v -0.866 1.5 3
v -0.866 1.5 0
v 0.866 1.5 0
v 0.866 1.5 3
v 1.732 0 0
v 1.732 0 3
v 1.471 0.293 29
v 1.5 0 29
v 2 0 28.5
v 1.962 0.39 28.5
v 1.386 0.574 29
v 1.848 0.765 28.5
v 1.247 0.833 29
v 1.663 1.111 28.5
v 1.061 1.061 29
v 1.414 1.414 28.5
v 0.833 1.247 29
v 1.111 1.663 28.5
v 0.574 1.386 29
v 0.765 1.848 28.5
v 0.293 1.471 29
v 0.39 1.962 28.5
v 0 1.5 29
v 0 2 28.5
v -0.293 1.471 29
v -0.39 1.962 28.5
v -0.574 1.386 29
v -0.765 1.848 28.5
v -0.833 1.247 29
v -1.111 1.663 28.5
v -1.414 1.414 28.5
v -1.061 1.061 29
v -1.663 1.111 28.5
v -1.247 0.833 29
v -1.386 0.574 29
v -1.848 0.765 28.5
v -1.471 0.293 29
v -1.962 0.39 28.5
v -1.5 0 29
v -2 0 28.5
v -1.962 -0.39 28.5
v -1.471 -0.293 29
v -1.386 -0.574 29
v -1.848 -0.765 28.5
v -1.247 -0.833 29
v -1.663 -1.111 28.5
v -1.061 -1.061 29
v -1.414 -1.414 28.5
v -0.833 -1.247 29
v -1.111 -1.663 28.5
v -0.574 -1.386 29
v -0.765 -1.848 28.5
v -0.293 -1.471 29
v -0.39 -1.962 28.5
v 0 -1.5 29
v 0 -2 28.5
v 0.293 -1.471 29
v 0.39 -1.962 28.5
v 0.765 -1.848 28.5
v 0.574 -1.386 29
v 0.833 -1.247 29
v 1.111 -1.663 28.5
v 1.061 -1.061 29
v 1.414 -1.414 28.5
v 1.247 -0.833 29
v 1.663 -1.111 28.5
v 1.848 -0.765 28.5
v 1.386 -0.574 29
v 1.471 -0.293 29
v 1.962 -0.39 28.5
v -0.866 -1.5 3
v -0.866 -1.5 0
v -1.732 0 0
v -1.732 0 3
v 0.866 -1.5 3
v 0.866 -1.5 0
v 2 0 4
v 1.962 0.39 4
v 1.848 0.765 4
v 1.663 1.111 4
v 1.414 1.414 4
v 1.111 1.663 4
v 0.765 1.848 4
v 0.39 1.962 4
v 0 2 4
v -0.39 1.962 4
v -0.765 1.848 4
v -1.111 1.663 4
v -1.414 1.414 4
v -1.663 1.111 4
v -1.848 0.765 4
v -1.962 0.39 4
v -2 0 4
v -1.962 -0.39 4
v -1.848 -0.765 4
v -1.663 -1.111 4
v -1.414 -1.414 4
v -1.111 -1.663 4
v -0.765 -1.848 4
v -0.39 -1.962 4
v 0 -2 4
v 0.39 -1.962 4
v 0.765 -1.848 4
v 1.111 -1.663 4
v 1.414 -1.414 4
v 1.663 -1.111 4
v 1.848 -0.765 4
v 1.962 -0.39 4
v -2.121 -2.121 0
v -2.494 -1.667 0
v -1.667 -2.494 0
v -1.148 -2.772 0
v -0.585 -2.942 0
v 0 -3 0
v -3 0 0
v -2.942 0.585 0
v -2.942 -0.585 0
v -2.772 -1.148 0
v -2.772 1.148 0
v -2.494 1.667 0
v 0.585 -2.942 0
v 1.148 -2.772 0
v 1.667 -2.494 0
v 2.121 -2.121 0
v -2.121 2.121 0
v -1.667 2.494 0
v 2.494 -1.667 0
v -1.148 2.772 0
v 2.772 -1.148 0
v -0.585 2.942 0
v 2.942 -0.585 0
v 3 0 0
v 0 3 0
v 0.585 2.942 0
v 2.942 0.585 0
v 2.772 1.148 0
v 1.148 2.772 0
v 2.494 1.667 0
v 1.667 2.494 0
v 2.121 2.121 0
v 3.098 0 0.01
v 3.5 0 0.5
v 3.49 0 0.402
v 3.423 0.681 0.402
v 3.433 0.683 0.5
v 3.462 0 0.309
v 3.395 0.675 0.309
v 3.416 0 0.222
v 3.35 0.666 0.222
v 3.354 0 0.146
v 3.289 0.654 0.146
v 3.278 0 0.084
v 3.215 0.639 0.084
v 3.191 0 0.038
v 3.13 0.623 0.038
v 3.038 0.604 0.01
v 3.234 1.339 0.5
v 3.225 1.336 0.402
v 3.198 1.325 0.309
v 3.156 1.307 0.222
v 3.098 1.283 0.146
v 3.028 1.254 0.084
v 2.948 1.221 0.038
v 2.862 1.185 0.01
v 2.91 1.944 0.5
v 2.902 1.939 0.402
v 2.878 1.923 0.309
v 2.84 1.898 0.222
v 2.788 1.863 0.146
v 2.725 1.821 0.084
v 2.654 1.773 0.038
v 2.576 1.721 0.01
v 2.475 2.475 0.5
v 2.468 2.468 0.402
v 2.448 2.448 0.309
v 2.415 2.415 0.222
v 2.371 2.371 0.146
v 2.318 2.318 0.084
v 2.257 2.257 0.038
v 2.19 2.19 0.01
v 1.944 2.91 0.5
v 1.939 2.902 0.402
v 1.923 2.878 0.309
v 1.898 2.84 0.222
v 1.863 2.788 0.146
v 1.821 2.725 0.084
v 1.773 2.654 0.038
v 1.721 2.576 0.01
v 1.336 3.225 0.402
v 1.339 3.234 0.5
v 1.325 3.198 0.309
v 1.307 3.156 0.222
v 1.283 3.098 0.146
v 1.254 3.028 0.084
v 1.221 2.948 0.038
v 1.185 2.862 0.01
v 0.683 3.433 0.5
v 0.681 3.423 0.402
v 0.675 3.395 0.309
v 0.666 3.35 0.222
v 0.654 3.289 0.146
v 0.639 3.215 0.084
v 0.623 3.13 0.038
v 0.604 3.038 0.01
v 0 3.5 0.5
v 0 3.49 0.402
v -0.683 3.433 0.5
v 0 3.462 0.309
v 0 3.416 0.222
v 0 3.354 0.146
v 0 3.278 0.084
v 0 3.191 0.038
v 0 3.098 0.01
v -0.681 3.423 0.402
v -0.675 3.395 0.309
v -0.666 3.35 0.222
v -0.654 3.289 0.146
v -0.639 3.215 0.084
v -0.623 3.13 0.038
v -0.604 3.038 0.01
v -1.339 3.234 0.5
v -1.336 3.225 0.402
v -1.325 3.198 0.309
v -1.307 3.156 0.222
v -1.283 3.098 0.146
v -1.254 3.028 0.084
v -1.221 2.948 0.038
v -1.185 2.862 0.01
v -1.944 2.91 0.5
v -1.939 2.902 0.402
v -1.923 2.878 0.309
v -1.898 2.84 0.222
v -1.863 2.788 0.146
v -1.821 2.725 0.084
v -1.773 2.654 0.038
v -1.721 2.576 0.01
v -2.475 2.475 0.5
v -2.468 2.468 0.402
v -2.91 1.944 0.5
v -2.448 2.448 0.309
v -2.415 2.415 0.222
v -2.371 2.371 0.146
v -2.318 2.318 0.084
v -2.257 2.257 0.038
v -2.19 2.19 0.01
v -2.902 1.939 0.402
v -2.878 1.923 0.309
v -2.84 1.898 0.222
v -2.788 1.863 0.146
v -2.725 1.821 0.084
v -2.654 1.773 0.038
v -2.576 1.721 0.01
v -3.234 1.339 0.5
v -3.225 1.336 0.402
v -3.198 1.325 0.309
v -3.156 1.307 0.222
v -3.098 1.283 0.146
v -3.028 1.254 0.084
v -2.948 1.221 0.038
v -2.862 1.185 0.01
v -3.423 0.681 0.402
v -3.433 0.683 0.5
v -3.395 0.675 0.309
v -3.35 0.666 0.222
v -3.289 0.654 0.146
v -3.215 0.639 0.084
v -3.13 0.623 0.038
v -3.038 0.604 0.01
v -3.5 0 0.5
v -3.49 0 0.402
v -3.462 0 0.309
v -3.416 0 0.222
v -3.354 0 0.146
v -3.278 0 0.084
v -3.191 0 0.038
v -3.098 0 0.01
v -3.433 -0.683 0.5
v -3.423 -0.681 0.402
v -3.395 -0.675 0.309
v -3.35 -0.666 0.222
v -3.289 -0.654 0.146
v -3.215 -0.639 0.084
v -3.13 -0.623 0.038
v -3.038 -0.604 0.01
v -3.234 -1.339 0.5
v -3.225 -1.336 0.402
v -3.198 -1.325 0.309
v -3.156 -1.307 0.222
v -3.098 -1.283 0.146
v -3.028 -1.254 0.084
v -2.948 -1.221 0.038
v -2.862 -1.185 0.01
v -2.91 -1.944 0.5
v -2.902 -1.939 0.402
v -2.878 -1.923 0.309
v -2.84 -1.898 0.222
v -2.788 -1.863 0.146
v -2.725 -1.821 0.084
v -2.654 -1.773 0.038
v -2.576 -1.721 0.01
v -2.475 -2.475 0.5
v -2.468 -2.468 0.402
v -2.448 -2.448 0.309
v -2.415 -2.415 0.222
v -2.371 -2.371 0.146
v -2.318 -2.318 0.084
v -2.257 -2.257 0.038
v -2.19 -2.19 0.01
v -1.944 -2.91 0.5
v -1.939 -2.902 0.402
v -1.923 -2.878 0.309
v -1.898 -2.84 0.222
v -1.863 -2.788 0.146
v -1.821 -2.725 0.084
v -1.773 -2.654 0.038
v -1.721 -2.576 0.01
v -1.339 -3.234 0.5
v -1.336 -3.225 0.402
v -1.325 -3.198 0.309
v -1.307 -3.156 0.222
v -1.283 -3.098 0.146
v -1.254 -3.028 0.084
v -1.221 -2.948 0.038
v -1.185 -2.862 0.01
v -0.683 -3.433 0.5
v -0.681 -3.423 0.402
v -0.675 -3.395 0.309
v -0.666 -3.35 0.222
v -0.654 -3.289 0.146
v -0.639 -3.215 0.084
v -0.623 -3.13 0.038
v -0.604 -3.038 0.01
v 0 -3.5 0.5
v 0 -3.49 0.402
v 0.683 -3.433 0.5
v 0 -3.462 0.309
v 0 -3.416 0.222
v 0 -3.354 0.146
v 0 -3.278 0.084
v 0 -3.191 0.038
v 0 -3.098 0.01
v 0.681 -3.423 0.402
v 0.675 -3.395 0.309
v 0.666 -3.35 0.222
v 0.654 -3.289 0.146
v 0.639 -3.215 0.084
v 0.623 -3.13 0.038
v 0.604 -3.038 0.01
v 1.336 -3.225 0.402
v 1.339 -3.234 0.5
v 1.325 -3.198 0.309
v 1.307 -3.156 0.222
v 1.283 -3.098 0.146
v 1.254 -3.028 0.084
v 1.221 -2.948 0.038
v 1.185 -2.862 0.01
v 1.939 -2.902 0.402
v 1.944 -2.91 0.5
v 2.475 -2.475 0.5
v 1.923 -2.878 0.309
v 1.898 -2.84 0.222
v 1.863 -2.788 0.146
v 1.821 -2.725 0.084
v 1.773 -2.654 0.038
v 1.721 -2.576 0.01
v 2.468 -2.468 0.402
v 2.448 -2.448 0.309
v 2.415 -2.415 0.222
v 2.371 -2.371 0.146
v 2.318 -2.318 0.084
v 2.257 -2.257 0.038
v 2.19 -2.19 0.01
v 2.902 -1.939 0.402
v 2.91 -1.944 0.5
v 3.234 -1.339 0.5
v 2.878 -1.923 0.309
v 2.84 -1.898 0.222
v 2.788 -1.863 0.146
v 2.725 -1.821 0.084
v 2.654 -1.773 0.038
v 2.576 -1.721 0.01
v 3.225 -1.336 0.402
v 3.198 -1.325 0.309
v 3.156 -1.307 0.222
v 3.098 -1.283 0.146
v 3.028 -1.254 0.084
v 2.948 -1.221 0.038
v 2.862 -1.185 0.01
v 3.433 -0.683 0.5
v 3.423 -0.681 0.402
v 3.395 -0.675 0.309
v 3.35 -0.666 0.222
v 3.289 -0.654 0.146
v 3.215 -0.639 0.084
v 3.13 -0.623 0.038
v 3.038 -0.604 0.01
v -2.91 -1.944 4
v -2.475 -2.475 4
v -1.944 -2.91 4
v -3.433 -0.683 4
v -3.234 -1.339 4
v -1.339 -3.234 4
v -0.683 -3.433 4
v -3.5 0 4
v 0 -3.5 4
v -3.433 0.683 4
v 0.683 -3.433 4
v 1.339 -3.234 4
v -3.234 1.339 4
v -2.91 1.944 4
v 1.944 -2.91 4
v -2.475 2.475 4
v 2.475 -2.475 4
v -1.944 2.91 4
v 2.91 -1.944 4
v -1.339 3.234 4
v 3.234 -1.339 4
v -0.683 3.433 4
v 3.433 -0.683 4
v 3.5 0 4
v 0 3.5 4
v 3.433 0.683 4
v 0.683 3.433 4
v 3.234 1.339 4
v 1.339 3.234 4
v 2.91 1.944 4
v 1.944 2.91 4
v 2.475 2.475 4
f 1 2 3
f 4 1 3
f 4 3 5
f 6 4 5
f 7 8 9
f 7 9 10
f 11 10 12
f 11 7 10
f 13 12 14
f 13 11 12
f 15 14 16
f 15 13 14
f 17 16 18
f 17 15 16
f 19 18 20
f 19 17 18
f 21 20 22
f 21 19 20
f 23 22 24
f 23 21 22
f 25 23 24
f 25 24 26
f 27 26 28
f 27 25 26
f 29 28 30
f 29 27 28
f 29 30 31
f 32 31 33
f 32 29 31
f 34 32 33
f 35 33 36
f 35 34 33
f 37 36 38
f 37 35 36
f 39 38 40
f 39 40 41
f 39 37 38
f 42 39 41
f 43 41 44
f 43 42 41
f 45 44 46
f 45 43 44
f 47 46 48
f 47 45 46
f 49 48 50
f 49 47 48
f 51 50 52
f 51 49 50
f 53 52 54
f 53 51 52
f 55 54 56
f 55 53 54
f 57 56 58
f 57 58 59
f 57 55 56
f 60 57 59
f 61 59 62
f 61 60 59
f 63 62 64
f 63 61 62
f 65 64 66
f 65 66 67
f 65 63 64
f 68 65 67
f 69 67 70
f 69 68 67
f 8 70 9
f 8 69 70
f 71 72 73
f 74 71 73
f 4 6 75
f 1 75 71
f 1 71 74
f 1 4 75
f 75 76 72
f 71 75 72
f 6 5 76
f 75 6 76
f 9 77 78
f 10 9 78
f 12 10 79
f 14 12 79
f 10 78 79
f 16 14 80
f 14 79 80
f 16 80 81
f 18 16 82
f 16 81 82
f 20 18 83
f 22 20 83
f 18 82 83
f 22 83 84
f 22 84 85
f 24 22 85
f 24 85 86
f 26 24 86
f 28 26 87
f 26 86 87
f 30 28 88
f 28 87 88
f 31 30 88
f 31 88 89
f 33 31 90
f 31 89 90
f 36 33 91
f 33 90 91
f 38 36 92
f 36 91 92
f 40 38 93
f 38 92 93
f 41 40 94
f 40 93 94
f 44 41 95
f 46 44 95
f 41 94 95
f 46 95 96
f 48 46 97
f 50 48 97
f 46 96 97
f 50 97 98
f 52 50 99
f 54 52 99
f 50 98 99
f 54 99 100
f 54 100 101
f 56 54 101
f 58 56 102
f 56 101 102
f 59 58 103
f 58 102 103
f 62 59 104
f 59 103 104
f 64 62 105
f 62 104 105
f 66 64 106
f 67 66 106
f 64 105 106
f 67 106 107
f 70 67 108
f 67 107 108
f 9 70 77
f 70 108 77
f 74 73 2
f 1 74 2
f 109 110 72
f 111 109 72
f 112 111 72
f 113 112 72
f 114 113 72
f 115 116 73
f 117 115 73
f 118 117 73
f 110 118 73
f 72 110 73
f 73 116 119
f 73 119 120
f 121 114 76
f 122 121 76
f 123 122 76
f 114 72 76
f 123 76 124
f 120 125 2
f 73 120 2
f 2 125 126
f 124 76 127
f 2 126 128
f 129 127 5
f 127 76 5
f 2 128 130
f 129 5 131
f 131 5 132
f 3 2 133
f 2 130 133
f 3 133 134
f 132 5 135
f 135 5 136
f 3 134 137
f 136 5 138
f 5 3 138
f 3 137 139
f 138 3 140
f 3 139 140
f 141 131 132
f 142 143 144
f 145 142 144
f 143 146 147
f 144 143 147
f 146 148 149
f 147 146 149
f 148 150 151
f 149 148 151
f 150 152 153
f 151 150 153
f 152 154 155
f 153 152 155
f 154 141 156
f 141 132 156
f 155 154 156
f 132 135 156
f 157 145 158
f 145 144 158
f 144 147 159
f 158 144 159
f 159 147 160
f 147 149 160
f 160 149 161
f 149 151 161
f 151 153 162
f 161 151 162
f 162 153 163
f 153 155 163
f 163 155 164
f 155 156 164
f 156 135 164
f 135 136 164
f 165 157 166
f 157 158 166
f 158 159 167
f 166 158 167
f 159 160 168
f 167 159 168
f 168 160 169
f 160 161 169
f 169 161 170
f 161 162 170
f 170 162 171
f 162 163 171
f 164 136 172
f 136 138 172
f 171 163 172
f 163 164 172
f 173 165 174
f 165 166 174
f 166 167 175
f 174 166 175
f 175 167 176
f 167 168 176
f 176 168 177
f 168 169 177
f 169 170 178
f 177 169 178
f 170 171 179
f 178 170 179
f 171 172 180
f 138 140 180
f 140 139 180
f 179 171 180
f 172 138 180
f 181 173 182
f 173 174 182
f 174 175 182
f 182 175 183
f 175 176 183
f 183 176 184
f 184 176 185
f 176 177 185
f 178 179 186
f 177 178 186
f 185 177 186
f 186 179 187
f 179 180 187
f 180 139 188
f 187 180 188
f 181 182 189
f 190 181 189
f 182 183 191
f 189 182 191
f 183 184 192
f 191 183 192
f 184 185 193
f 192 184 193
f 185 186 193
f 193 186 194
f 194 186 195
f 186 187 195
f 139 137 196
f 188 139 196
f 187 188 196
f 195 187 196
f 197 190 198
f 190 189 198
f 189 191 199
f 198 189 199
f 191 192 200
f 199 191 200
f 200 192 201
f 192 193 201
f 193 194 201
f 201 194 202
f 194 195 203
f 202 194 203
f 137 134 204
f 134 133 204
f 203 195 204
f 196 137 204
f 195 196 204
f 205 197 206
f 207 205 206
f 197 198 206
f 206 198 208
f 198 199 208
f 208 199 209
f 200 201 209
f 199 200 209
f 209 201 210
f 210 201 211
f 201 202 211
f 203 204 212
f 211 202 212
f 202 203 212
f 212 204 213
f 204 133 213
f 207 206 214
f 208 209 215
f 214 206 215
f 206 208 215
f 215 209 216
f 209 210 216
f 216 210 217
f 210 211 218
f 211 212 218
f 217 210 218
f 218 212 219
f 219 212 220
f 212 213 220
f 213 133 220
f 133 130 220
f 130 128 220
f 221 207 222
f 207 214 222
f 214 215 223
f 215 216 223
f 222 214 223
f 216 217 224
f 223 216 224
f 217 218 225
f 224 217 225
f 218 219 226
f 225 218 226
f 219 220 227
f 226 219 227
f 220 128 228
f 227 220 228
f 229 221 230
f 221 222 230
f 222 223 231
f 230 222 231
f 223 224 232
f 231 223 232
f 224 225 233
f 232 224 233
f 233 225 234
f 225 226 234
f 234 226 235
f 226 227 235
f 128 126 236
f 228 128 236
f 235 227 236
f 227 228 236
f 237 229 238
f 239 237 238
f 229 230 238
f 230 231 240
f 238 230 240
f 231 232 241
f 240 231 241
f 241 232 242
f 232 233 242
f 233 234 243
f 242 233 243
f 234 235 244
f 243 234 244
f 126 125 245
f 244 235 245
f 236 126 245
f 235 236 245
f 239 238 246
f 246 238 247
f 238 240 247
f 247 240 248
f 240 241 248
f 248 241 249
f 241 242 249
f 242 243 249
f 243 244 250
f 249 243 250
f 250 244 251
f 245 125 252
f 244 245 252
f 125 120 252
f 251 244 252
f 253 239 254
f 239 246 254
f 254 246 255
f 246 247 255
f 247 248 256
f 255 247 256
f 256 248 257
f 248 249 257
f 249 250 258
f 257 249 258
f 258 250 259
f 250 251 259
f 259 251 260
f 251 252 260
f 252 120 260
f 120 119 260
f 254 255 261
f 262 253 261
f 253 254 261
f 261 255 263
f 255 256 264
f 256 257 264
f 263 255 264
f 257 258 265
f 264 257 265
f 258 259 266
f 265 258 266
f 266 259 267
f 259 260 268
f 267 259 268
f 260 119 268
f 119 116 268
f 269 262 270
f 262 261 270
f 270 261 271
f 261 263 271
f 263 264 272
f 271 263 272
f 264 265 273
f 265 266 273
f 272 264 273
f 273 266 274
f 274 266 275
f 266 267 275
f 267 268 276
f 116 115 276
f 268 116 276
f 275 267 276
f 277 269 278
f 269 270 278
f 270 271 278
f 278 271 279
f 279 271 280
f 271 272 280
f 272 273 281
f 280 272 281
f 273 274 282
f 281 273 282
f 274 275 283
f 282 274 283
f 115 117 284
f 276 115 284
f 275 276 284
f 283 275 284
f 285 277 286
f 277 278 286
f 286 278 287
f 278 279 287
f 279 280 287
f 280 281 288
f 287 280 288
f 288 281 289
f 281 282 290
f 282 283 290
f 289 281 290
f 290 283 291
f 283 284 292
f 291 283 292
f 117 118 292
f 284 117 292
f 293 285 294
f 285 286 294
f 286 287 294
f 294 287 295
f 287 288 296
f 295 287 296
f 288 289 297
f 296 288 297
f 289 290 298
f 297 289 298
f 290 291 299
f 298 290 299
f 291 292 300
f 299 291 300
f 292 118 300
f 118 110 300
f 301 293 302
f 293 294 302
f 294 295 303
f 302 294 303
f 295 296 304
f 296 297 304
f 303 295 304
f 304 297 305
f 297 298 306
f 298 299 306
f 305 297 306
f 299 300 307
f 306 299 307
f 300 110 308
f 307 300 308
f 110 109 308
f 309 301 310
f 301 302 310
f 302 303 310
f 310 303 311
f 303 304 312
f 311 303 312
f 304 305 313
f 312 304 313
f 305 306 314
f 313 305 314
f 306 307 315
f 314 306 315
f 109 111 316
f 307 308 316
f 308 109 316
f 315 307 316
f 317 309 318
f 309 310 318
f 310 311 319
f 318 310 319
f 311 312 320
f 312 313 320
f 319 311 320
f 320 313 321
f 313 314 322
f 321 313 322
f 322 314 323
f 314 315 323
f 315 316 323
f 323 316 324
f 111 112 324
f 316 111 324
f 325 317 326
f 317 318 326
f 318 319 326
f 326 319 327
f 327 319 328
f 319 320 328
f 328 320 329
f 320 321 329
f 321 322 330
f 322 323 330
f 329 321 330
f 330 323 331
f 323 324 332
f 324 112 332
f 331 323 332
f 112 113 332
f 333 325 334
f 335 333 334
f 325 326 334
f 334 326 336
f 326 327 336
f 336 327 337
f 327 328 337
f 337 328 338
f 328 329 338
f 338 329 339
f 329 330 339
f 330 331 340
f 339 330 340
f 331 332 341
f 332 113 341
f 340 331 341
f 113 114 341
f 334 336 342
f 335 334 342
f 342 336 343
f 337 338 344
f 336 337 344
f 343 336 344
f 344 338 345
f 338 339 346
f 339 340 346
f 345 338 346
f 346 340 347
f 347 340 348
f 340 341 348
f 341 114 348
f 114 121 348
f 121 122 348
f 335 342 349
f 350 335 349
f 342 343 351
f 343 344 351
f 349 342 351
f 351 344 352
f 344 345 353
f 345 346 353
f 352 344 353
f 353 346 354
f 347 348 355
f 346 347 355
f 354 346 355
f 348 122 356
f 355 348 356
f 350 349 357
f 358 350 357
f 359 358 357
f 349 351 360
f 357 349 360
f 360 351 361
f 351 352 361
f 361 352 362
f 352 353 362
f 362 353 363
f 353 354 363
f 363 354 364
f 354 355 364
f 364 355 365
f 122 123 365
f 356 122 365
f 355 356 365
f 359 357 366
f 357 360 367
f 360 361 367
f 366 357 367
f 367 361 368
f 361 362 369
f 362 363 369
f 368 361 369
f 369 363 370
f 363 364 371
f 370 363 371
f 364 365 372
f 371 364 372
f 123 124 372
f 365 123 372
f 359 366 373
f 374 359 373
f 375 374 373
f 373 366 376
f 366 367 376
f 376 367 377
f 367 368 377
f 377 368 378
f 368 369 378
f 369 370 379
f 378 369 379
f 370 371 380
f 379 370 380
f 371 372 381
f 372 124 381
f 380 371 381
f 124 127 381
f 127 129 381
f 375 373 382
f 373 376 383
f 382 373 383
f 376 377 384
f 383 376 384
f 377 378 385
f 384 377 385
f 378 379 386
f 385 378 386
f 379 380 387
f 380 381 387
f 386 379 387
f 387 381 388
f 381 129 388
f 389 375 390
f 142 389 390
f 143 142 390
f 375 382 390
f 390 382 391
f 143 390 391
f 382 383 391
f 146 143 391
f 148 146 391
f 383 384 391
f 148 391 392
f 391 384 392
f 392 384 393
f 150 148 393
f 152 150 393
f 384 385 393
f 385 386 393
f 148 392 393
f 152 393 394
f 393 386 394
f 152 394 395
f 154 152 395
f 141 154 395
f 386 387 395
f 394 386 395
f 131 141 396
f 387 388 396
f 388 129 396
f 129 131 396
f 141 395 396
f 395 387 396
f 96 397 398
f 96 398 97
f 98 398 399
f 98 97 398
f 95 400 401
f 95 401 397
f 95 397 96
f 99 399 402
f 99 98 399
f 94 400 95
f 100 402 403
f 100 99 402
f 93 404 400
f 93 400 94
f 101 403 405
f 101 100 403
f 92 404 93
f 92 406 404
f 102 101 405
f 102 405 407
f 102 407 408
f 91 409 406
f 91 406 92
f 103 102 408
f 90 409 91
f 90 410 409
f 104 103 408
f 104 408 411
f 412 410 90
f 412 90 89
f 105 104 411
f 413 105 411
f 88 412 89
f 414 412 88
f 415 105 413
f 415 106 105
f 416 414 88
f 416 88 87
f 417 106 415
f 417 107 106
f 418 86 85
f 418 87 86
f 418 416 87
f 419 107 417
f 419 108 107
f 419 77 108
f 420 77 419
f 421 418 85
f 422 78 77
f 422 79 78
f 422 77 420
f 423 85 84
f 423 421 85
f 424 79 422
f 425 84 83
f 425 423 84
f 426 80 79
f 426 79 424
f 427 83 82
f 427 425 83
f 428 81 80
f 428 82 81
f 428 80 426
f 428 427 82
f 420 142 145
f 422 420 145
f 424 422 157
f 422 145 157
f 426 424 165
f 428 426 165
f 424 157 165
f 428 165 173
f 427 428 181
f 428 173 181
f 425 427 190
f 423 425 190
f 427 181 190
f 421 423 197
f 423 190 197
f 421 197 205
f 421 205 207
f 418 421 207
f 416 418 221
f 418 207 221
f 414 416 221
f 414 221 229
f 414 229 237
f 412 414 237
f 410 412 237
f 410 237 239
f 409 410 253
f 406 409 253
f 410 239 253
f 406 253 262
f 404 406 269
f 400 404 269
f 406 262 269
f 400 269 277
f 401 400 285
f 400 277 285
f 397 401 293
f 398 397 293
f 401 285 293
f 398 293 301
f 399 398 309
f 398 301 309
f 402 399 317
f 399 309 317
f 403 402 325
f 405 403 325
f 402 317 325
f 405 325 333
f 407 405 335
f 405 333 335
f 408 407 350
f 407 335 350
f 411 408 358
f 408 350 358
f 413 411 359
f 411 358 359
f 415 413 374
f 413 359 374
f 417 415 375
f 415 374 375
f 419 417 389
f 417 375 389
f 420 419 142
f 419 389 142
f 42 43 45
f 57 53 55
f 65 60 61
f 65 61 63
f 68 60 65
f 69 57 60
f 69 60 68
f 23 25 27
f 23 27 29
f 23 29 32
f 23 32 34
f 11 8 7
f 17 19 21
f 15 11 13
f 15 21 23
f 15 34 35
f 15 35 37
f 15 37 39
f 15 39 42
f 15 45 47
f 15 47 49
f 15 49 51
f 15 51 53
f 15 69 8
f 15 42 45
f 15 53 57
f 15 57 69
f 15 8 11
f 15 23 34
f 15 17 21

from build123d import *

# Parameters (mm, degrees)
ESQUISSE1_R             = 3.5
BOSS_EXTRU_1_DEPTH      = 4
ESQUISSE2_R             = 2
BOSS_EXTRU_2_DEPTH      = 25
ENL_V_MAT_EXTRU_1_DEPTH = 3
CHANFREIN1_SIZE         = 0.5
CONG_1_R                = 0.5


with BuildPart() as part:
    # Esquisse1 → Boss.-Extru.1 (new body)
    with BuildSketch(Plane.XY):
        Circle(ESQUISSE1_R)
    extrude(amount=BOSS_EXTRU_1_DEPTH)

    # Esquisse2 → Boss.-Extru.2 (add)
    with BuildSketch(Plane.XY.offset(4)):
        Circle(ESQUISSE2_R)
    extrude(amount=BOSS_EXTRU_2_DEPTH)

    # Esquisse3 → Enlèv. mat.-Extru.1 (cut)
    with BuildSketch(Plane(origin=(0, 0, 0), x_dir=(-1, 0, 0), z_dir=(0, 0, -1))):
        Polygon((1.732050808, 0), (0.866025404, 1.5), (-0.866025404, 1.5), (-1.732050808, 0), (-0.866025404, -1.5), (0.866025404, -1.5), align=None)
    extrude(amount=-ENL_V_MAT_EXTRU_1_DEPTH, mode=Mode.SUBTRACT)

    # Chanfrein1
    chanfrein1_edges = [part.edges().sort_by_distance(p)[0] for p in [
        (-2, 0, 29),
    ]]
    chamfer(chanfrein1_edges, length=CHANFREIN1_SIZE)

    # Congé1
    cong_1_edges = [part.edges().sort_by_distance(p)[0] for p in [
        (-3.5, 0, 0),
    ]]
    fillet(cong_1_edges, radius=CONG_1_R)


solid = part.part
